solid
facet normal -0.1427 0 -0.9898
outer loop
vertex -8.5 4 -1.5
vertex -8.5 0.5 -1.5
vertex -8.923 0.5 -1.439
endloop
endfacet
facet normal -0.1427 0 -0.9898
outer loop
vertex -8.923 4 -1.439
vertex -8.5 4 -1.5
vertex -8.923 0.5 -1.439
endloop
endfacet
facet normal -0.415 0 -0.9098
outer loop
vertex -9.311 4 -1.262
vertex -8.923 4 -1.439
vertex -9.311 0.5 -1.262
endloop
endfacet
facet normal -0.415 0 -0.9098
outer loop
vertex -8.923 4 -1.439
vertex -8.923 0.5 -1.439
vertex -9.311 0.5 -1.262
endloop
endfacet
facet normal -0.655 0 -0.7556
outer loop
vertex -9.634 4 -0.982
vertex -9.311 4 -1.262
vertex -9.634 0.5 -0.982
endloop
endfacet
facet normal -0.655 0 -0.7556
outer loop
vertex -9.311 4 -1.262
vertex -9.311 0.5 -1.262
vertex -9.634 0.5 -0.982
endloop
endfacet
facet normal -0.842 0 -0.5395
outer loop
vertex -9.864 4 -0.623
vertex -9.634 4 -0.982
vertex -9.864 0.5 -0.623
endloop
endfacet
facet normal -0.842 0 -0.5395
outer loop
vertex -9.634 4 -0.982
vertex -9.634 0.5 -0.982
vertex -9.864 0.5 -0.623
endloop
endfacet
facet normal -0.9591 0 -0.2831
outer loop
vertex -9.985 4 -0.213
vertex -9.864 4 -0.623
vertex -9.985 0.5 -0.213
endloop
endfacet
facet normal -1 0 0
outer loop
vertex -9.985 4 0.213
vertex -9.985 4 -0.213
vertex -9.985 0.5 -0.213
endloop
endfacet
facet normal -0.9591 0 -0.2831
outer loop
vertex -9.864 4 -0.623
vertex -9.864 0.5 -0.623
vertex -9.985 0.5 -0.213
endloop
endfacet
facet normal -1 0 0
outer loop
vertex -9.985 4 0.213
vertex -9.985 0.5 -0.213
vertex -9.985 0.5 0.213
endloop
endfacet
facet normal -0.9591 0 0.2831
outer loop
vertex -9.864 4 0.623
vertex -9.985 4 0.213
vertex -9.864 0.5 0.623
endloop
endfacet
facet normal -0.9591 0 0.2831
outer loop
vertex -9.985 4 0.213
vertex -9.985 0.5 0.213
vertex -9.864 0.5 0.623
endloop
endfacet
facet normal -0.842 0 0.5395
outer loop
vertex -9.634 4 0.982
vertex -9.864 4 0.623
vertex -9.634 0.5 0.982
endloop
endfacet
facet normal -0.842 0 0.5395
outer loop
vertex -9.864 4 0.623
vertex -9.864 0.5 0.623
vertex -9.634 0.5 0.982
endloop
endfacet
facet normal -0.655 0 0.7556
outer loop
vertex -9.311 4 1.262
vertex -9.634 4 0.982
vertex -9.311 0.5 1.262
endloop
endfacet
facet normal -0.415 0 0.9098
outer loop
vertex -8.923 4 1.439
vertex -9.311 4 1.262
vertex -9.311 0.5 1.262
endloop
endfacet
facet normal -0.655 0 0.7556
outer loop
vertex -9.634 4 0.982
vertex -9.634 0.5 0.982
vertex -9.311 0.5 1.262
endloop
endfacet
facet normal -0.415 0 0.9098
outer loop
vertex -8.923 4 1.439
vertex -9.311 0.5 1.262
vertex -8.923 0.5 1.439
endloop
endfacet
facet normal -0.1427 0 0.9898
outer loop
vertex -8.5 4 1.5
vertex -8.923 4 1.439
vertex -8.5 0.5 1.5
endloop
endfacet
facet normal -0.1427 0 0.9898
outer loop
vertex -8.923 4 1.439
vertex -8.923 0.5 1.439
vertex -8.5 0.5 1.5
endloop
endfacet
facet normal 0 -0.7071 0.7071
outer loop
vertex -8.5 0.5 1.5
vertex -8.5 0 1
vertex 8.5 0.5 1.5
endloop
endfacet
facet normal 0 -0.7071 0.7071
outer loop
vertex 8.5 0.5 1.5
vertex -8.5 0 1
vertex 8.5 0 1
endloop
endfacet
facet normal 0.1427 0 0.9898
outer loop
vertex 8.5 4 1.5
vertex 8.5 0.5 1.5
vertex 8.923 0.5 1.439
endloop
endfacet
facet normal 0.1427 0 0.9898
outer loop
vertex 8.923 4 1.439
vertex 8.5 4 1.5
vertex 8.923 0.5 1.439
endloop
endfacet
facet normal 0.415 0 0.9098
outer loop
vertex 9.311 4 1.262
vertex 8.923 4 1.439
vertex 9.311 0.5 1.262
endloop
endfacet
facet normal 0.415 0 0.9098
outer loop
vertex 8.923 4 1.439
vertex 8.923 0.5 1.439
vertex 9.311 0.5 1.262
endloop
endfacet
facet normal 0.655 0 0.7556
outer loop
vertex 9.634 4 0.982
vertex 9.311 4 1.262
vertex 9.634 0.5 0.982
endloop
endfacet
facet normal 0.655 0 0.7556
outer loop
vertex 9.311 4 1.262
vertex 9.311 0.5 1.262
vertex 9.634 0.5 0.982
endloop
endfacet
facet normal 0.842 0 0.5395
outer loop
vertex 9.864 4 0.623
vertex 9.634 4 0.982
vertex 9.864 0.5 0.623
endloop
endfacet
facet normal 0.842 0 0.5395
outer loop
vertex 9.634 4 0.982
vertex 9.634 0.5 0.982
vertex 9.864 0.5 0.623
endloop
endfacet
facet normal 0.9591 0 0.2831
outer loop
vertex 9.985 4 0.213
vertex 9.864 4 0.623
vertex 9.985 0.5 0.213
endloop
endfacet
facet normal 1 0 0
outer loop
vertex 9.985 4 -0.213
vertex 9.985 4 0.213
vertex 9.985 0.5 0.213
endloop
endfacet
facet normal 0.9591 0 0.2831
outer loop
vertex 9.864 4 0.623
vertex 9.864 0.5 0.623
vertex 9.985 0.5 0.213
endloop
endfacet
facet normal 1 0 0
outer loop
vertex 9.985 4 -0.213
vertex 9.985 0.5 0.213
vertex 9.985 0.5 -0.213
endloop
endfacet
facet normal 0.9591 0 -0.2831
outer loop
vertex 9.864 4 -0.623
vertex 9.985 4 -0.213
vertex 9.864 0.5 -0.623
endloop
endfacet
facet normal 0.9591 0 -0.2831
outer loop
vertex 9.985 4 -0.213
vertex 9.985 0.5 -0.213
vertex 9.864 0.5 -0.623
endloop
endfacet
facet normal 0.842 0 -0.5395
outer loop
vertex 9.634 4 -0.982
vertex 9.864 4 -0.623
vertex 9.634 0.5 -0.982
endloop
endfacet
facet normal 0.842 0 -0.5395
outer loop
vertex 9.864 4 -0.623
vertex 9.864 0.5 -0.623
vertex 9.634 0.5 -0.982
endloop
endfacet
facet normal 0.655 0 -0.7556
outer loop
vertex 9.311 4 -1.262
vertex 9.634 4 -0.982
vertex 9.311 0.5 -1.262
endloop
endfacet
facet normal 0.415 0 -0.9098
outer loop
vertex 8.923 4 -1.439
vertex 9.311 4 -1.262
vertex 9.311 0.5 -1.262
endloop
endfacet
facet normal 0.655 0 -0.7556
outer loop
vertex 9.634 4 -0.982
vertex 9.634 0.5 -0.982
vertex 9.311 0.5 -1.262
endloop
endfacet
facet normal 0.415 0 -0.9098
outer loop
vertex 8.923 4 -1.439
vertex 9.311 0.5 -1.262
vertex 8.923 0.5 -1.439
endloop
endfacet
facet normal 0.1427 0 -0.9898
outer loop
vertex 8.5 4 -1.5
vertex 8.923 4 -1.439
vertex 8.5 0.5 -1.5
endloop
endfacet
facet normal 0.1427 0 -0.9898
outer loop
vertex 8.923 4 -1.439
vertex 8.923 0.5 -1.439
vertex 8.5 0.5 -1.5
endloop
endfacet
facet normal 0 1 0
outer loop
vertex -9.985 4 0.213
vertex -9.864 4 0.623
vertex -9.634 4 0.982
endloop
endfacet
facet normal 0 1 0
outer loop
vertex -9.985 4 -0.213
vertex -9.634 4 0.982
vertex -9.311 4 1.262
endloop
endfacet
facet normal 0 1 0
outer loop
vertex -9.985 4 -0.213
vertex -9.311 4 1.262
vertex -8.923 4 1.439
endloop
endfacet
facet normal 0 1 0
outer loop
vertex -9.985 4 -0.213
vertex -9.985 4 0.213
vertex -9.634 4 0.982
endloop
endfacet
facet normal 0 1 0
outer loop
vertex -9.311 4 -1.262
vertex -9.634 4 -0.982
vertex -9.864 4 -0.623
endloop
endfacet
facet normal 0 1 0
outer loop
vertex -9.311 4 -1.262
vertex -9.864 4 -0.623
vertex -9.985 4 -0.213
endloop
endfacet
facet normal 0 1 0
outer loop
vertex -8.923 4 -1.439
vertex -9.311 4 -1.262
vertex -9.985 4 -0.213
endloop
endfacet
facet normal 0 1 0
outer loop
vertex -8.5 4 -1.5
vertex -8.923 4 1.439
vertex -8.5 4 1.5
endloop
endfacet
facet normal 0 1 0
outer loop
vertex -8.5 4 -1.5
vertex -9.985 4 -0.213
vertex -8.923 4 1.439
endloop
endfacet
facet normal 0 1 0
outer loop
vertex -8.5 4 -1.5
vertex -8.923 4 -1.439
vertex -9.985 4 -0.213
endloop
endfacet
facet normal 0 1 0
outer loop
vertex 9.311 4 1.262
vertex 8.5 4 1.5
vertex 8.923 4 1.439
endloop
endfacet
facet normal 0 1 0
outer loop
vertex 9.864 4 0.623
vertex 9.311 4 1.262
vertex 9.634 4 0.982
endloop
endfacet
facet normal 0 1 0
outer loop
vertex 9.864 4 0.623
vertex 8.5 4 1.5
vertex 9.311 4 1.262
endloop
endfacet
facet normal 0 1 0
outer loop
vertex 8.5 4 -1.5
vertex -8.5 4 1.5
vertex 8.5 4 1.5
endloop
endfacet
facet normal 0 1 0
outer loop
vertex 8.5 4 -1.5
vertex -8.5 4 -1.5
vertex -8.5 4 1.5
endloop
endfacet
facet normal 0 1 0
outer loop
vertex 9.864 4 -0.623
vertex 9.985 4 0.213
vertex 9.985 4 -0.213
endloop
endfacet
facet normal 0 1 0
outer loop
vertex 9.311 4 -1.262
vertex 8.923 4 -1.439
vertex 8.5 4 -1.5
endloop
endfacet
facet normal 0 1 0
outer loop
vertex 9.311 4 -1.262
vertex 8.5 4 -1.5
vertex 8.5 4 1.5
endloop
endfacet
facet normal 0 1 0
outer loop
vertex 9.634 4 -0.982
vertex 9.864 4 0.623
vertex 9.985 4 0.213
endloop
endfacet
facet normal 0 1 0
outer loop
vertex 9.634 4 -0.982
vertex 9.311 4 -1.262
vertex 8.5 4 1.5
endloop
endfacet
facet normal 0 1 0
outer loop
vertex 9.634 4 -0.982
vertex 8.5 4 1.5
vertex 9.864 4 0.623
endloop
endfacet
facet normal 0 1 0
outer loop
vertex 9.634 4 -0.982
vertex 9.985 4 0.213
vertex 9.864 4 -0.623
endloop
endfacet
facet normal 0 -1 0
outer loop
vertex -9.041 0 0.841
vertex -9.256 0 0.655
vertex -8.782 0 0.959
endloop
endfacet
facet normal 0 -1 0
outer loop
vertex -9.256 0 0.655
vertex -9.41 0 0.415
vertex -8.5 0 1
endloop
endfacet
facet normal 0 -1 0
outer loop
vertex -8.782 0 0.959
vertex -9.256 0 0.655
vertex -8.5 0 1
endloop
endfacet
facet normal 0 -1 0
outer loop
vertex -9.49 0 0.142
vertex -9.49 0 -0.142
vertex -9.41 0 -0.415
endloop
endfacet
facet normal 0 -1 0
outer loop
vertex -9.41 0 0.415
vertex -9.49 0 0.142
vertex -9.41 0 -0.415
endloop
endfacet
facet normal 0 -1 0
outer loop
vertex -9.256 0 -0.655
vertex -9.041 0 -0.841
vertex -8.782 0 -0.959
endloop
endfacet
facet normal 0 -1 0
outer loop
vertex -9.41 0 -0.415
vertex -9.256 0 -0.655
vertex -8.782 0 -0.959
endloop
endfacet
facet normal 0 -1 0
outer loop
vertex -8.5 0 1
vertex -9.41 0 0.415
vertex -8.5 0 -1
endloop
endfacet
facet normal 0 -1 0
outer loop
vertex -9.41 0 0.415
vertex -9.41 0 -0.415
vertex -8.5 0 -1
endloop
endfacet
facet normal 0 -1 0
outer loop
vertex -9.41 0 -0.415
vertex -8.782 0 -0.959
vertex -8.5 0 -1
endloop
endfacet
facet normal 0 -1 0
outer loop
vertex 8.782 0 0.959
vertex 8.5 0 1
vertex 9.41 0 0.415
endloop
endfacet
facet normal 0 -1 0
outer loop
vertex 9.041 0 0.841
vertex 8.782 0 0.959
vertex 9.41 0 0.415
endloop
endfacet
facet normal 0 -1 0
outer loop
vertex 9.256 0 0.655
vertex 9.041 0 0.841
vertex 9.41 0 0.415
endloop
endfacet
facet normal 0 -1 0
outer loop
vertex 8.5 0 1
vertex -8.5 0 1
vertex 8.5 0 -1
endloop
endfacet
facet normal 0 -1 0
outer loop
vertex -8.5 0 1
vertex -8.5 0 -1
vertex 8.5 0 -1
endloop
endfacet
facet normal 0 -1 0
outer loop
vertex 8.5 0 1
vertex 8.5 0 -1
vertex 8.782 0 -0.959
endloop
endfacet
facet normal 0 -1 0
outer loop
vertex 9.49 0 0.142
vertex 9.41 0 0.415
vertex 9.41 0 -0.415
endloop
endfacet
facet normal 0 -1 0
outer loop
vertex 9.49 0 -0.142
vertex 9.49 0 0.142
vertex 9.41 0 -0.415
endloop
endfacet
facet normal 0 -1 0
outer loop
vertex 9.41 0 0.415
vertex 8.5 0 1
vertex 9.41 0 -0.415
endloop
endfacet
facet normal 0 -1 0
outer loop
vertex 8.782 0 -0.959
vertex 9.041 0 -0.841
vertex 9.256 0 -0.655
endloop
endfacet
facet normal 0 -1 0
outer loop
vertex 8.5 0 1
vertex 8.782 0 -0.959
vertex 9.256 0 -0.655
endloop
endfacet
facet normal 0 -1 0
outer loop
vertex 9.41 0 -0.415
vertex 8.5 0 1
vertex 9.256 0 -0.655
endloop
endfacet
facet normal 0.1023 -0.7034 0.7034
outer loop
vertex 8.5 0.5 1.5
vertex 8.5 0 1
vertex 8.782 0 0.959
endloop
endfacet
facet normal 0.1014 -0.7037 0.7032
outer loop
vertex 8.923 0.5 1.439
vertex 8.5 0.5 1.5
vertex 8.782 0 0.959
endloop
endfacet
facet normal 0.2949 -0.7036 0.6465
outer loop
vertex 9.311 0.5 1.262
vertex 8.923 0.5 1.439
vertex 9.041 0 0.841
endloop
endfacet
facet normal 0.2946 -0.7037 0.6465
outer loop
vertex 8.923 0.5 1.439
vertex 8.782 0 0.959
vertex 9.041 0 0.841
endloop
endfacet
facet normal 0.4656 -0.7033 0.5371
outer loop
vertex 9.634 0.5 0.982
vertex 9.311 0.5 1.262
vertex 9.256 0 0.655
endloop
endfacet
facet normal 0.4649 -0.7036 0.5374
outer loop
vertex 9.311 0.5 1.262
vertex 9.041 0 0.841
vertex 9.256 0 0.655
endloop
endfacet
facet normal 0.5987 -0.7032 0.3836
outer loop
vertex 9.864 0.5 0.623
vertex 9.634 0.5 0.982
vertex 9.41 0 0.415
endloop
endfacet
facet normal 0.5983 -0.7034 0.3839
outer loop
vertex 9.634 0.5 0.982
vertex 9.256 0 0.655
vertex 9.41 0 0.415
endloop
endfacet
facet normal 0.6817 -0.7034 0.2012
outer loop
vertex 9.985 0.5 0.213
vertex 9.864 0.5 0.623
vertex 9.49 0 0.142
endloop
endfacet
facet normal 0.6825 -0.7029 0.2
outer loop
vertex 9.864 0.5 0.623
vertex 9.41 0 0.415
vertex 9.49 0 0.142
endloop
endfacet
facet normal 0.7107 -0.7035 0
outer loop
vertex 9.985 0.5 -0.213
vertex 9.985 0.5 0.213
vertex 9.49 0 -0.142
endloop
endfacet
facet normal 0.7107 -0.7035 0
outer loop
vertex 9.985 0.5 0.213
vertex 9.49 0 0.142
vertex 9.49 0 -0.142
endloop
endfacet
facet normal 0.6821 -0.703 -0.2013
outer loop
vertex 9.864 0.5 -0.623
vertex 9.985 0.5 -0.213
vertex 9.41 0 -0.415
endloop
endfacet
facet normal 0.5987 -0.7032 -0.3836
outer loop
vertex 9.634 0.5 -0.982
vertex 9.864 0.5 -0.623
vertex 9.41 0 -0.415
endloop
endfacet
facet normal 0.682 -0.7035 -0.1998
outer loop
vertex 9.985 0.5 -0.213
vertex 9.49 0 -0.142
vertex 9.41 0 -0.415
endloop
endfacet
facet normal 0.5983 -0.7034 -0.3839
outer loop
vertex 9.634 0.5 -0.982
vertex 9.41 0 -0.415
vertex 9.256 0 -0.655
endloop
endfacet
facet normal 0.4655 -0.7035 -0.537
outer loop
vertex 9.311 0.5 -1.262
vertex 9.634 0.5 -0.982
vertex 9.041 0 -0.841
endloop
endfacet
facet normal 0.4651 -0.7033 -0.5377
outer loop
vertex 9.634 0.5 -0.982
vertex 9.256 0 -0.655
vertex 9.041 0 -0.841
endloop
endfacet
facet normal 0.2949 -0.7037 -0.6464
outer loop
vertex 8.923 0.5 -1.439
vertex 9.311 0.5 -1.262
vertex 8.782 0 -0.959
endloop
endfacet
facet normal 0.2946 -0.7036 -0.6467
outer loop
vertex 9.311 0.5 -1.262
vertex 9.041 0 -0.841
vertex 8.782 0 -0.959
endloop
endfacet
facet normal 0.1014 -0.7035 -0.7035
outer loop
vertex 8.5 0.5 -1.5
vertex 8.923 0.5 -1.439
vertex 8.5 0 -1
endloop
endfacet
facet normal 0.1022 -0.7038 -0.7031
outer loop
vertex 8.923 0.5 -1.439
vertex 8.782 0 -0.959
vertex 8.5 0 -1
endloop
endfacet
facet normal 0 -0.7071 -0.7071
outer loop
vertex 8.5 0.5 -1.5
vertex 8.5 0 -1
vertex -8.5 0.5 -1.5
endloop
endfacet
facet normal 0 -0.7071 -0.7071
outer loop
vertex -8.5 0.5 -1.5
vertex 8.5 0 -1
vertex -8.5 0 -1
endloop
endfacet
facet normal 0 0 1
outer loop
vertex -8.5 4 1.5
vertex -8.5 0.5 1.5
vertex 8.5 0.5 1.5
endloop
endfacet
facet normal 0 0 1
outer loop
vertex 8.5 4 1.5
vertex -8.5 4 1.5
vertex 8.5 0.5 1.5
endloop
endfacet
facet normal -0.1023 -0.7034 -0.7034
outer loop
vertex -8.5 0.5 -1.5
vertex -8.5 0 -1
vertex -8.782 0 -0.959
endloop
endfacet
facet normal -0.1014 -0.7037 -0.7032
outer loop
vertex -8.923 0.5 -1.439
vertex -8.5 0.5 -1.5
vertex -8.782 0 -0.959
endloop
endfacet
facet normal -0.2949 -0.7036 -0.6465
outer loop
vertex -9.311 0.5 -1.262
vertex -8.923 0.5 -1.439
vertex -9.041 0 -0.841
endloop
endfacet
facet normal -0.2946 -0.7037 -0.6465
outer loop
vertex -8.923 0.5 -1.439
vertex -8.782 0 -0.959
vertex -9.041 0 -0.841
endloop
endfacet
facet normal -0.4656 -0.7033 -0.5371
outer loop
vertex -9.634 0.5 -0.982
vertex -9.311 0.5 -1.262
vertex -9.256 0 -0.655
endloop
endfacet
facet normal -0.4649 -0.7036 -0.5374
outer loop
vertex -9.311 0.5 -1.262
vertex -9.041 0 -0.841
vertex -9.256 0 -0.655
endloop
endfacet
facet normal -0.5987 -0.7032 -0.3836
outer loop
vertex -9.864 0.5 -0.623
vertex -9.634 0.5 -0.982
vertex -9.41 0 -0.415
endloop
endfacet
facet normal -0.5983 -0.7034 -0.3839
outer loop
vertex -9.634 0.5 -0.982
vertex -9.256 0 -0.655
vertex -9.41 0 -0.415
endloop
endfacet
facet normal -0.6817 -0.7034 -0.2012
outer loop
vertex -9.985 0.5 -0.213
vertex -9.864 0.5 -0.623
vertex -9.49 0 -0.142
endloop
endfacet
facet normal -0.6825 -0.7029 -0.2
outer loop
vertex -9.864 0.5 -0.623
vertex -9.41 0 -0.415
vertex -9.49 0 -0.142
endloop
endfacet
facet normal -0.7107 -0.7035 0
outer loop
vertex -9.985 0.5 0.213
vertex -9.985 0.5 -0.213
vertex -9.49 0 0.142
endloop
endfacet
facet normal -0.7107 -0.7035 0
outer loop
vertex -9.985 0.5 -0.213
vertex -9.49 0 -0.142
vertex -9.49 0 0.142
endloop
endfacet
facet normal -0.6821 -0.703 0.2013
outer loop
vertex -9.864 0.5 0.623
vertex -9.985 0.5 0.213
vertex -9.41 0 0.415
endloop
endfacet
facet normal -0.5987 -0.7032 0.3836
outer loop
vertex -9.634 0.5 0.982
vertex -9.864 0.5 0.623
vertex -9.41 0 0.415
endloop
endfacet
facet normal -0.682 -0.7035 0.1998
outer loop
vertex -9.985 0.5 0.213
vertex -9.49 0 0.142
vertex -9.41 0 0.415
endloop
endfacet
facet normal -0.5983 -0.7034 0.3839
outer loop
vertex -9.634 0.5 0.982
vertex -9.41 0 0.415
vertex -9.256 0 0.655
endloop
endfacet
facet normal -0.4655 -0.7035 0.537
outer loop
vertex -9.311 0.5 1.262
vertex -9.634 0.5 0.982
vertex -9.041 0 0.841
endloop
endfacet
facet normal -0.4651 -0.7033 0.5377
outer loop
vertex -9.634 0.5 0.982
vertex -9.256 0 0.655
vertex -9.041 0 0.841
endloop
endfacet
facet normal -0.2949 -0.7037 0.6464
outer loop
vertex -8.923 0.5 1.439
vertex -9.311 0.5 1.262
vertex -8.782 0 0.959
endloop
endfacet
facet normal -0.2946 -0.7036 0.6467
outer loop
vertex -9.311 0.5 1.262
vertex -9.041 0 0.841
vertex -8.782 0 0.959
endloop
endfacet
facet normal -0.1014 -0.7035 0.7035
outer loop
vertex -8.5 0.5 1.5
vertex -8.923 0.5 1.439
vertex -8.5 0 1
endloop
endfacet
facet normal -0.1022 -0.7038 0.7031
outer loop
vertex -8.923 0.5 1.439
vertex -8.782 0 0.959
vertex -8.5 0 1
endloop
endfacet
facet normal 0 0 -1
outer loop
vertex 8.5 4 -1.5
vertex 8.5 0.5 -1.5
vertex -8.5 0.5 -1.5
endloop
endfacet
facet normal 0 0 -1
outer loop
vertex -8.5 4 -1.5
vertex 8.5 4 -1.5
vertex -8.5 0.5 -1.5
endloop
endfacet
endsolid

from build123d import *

# Parameters (mm, degrees)
EXTRUDE_1_DEPTH = 4
CHAMFER_1_SIZE  = 0.5


with BuildPart() as part:
    # 草图1 → 凸台-拉伸1 (new body)
    with BuildSketch(Plane(origin=(0, 0, 0), x_dir=(1, 0, 0), z_dir=(0, 1, 0))):
        with BuildLine():
            Line((-8.5, -1.5), (8.5, -1.5))
            ThreePointArc((8.5, -1.5), (10, 0), (8.5, 1.5))
            Line((8.5, 1.5), (-8.5, 1.5))
            ThreePointArc((-8.5, 1.5), (-10, 0), (-8.5, -1.5))
        make_face()
    extrude(amount=EXTRUDE_1_DEPTH)

    # 倒角1
    chamfer_1_edges = [part.edges().sort_by_distance(p)[0] for p in [
        (0, 0, 1.5),
        (-10, 0, 0),
        (0, 0, -1.5),
        (10, 0, 0),
    ]]
    chamfer(chamfer_1_edges, length=CHAMFER_1_SIZE)


solid = part.part
